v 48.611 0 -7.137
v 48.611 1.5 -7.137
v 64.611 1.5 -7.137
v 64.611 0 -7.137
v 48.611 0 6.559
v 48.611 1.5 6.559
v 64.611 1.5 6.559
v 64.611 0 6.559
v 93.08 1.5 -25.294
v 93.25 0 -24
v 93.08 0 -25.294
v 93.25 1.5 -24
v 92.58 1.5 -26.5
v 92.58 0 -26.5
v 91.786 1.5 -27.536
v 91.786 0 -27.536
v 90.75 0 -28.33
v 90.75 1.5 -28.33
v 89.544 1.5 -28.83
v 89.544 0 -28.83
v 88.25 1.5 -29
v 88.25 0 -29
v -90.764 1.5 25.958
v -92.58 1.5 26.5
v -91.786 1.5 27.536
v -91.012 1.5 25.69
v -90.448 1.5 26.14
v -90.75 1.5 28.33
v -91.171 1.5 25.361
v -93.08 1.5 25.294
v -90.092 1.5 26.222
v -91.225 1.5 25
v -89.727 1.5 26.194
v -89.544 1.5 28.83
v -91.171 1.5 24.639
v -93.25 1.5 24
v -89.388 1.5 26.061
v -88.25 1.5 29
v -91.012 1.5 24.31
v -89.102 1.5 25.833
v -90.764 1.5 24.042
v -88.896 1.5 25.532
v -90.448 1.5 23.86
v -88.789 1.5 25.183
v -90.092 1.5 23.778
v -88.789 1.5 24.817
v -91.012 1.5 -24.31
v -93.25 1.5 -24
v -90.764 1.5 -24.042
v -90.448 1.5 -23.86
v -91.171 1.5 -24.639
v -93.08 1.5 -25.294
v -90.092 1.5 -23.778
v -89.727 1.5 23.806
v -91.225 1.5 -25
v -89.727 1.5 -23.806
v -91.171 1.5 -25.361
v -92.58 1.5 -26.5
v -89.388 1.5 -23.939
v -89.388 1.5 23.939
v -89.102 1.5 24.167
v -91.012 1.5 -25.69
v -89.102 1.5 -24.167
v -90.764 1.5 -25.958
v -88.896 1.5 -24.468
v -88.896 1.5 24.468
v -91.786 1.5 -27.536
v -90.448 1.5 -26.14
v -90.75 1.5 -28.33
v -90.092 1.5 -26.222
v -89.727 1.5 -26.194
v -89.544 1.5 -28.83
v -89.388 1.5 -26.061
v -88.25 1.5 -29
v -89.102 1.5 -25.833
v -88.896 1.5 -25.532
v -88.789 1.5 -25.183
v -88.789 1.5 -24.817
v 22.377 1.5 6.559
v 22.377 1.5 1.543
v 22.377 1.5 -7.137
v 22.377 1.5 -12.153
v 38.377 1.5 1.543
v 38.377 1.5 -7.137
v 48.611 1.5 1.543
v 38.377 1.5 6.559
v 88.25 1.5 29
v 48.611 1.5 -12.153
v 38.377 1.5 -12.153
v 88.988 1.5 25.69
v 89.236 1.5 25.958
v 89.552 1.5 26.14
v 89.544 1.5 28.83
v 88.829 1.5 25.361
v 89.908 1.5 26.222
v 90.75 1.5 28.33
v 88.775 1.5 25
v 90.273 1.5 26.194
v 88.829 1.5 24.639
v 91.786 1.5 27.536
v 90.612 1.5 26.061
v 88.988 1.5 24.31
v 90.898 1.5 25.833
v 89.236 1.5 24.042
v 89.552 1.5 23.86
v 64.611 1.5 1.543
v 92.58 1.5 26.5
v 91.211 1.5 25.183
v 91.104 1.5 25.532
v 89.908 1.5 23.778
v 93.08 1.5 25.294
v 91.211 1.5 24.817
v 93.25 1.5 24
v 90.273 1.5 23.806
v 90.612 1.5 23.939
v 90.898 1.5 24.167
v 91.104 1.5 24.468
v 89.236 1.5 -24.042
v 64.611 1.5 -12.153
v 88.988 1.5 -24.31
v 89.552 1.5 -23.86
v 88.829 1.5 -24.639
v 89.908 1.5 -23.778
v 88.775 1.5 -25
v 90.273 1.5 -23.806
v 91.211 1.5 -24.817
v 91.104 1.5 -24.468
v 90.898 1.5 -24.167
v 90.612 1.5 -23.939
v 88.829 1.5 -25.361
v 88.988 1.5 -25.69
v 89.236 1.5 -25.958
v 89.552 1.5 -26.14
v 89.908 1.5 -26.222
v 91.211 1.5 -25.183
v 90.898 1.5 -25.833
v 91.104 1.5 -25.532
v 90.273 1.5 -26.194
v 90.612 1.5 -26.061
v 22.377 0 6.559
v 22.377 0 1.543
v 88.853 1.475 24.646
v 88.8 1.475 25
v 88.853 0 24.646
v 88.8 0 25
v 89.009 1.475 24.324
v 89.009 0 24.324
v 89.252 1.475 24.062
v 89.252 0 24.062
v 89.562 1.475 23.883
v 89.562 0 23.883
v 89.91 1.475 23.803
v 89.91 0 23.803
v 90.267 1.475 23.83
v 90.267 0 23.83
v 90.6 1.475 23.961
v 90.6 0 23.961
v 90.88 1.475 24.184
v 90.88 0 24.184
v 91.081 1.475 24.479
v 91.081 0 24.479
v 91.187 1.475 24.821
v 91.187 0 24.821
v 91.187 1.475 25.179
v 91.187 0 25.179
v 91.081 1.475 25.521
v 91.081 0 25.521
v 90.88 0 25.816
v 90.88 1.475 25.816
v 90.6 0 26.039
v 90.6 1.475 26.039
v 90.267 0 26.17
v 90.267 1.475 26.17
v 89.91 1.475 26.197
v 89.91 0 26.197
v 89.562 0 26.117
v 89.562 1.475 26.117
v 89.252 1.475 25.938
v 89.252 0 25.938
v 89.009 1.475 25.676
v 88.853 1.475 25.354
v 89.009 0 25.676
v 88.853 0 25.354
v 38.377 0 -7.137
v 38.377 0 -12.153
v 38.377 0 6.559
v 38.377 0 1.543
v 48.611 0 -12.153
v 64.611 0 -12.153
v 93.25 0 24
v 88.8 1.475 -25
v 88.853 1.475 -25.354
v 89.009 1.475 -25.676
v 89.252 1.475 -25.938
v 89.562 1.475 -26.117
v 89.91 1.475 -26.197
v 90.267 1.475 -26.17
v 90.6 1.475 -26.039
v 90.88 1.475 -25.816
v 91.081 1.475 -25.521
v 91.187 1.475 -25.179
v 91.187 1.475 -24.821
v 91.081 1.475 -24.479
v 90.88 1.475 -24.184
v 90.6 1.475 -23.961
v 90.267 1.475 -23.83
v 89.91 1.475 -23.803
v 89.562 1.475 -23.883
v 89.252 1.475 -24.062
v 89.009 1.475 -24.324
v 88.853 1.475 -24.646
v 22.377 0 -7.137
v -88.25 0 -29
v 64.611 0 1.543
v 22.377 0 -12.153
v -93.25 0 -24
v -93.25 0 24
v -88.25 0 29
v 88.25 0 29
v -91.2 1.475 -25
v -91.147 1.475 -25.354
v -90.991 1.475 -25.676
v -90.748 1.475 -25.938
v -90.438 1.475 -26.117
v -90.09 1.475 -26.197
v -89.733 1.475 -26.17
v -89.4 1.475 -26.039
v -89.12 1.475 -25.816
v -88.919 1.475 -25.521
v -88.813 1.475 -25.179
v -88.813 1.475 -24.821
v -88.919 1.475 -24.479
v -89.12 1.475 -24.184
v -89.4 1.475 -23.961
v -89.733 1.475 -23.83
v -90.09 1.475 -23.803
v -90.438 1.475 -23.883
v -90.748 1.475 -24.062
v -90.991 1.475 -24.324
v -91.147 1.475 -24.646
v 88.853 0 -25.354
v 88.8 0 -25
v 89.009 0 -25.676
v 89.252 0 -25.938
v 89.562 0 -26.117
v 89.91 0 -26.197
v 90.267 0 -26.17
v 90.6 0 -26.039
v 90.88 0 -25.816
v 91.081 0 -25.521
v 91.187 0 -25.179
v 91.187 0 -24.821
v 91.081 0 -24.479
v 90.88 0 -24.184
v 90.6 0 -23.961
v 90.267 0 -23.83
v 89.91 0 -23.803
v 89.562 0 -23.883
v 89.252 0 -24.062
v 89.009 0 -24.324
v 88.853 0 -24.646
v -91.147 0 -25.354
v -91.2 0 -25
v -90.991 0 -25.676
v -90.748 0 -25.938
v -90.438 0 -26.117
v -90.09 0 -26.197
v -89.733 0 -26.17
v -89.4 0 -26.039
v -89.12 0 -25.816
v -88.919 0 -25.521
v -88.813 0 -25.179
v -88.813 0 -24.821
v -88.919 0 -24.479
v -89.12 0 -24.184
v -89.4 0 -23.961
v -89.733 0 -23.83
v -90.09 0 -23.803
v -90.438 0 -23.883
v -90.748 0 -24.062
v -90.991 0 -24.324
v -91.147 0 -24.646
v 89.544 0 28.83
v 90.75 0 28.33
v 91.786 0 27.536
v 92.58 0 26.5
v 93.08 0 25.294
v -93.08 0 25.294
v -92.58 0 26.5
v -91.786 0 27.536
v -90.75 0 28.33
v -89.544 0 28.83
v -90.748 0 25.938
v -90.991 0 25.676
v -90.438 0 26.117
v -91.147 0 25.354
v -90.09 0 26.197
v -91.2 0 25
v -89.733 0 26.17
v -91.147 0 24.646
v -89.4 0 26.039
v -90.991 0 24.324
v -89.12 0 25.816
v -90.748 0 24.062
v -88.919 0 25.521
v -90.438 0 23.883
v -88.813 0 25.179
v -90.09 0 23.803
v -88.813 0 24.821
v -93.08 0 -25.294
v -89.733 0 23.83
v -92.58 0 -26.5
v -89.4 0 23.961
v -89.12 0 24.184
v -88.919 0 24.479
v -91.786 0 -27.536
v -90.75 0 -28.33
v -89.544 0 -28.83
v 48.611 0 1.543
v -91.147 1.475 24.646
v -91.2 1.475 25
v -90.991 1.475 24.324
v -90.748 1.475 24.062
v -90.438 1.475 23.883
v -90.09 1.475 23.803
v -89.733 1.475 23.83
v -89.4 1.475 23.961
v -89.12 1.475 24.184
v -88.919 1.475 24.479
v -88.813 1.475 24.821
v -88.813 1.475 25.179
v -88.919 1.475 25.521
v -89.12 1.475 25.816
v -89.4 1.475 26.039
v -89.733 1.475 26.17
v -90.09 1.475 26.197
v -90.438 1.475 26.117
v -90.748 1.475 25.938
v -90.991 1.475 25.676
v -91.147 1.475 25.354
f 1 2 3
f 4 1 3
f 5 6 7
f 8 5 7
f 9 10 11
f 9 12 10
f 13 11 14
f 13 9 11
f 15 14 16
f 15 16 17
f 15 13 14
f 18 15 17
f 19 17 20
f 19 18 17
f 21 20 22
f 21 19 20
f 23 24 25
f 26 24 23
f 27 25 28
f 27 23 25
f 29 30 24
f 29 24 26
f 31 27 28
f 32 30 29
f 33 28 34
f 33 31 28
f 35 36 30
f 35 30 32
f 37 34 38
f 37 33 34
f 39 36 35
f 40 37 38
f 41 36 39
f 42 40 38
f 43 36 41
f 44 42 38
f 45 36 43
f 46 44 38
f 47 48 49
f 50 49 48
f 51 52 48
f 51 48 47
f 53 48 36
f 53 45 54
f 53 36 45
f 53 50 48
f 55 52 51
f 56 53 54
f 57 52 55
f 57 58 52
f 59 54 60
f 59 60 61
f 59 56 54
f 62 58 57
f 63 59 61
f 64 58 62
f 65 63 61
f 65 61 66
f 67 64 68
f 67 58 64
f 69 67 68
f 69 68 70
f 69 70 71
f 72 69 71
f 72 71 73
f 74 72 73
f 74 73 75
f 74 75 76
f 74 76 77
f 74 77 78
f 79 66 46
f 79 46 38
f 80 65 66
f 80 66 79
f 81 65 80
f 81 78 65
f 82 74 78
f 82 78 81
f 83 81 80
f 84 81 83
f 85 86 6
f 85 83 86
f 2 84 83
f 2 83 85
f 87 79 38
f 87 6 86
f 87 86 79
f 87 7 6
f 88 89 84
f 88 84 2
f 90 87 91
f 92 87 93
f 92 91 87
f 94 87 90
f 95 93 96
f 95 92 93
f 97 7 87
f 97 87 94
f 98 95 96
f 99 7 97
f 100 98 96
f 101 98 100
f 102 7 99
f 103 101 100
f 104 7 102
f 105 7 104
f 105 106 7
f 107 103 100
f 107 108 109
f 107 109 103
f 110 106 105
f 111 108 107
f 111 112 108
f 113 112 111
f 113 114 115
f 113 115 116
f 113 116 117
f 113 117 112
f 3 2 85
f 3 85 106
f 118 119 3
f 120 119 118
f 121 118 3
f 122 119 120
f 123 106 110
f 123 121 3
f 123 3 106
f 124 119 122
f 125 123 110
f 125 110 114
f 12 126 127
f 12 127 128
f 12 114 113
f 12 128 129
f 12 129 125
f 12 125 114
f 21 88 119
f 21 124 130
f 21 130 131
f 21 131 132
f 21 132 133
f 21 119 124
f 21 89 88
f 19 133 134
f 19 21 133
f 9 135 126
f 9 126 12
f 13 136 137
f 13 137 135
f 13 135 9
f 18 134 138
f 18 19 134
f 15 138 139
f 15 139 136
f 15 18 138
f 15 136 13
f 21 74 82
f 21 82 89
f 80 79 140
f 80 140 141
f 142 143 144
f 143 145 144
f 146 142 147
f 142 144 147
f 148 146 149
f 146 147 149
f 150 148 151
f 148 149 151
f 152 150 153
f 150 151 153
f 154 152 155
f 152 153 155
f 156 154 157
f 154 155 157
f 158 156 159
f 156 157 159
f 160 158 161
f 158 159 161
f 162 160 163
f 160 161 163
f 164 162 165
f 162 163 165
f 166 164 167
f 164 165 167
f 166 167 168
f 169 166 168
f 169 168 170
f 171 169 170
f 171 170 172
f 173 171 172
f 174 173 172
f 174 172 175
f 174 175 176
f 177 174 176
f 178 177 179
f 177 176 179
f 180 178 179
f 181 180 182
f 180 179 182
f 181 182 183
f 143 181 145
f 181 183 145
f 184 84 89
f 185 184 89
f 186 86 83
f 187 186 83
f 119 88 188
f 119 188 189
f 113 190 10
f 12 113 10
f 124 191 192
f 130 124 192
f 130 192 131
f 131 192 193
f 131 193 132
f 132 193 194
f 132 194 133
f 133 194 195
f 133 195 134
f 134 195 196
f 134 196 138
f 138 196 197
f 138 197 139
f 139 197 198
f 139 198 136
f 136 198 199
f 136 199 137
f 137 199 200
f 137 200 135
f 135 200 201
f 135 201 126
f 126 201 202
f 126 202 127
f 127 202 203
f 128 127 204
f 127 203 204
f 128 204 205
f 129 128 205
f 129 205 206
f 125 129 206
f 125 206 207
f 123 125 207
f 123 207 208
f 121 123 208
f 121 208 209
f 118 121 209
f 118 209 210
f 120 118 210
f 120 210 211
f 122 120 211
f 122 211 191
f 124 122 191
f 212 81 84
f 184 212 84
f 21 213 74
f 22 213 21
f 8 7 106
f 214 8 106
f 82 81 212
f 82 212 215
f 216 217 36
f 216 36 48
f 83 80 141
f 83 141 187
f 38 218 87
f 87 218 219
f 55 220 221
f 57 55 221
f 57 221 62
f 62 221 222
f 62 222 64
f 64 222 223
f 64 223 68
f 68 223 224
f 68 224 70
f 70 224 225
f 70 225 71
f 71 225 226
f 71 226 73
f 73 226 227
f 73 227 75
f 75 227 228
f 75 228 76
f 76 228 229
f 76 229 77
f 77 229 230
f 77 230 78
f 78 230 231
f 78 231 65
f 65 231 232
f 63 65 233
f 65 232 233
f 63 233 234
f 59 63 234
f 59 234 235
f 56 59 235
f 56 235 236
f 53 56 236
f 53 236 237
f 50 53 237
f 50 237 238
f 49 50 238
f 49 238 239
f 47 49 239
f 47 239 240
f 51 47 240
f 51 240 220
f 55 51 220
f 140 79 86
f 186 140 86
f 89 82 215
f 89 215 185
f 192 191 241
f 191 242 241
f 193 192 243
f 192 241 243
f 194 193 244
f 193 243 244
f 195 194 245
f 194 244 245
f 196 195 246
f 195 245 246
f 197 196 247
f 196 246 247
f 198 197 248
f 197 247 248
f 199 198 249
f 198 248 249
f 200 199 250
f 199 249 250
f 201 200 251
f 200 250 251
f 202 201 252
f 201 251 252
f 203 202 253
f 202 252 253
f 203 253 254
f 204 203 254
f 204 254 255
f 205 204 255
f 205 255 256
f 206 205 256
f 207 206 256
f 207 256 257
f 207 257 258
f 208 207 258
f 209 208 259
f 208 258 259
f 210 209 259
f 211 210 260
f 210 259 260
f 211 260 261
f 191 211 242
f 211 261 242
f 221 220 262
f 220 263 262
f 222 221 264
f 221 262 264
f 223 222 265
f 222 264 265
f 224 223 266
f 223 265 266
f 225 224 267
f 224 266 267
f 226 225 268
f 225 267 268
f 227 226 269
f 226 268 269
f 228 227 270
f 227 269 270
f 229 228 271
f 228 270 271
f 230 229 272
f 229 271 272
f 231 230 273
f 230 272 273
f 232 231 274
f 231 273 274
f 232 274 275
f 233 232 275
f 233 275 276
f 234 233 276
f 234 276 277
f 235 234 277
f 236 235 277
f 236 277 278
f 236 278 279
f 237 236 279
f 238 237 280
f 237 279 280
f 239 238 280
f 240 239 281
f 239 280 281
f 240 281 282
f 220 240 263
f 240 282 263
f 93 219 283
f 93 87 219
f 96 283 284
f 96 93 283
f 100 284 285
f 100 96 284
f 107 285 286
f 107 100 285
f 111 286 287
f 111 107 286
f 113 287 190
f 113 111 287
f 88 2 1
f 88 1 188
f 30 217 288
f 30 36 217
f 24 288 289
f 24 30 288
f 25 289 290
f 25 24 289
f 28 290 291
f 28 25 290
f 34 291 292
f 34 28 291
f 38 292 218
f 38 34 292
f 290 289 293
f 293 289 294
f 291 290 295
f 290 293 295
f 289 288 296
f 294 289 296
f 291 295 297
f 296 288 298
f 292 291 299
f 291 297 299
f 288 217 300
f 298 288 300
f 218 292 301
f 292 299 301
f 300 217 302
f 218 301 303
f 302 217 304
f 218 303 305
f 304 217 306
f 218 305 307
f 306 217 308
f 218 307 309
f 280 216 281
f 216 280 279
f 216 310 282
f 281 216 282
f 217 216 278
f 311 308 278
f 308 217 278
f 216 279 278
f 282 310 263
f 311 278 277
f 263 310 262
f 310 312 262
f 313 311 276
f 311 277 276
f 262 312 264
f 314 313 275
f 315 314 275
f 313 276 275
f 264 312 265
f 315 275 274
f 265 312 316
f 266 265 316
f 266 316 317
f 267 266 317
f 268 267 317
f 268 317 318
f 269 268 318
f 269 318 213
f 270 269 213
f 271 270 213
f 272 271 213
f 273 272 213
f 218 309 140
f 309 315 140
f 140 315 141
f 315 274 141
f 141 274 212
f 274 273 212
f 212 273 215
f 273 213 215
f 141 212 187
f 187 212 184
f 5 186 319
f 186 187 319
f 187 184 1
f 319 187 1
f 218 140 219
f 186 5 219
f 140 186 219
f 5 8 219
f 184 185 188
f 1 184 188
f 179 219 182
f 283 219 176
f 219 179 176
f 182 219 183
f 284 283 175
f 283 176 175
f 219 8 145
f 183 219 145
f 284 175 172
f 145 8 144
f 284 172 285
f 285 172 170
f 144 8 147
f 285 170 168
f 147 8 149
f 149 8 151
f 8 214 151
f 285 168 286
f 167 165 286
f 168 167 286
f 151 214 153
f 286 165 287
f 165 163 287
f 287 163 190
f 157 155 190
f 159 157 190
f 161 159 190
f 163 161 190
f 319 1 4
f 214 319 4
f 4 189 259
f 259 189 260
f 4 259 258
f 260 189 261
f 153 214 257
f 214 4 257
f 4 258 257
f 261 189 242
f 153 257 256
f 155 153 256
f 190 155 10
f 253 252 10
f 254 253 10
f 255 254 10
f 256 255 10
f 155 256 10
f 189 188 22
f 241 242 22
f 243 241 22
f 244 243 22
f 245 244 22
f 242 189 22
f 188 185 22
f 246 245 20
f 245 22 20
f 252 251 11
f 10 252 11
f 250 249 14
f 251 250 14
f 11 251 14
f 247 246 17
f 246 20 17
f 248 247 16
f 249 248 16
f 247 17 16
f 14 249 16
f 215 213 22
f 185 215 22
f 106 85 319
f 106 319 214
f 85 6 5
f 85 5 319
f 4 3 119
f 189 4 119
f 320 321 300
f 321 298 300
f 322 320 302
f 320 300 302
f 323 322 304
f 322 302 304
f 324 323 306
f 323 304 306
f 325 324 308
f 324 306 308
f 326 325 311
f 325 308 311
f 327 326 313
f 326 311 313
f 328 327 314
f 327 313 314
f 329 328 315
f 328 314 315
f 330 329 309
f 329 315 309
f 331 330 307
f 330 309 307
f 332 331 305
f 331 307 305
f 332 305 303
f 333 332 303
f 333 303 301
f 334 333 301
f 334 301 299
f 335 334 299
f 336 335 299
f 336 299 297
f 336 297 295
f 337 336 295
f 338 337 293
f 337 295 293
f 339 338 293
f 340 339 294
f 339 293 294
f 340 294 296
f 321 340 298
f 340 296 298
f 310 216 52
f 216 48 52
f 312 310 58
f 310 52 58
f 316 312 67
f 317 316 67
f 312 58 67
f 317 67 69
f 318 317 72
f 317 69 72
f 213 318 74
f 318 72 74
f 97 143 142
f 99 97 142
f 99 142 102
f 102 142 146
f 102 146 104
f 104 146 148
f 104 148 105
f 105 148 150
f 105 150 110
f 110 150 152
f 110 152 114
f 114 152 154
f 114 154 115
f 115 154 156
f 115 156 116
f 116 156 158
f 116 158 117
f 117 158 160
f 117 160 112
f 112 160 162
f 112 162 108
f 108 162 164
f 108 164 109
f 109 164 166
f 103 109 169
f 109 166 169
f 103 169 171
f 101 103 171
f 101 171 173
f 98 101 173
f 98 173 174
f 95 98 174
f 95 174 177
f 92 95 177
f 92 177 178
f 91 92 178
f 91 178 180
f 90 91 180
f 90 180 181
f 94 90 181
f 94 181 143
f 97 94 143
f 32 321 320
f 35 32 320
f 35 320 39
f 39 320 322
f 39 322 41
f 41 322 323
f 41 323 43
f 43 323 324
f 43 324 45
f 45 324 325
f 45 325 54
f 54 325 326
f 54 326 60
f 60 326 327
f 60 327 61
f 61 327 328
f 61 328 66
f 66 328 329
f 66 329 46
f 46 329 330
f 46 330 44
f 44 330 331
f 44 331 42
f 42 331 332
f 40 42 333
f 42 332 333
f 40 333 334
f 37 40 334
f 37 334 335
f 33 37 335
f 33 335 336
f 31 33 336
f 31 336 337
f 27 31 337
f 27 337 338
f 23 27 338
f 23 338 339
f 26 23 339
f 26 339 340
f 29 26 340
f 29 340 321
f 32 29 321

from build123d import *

# Parameters (mm, degrees)
SKETCH1_W                      = 186.5
SKETCH1_H                      = 58
BOSS_EXTRUDE1_DEPTH            = 1.5
FILLET1_R                      = 5
M2_CLEARANCE_HOLE1_D           = 2.4
M2_CLEARANCE_HOLE1_CSINK_D     = 2.45
M2_CLEARANCE_HOLE1_CSINK_ANGLE = 90
SKETCH4_W                      = 16
SKETCH4_H                      = 5.015455786
CUT_EXTRUDE1_DEPTH             = 98.666844425


with BuildPart() as part:
    # Sketch1 → Boss-Extrude1 (new body)
    with BuildSketch(Plane(origin=(0, 0, 0), x_dir=(1, 0, 0), z_dir=(0, 1, 0))):
        Rectangle(SKETCH1_W, SKETCH1_H)
    extrude(amount=BOSS_EXTRUDE1_DEPTH)

    # Fillet1
    fillet1_edges = [part.edges().sort_by_distance(p)[0] for p in [
        (-93.25, 0.75, -29),
        (93.25, 0.75, -29),
        (93.25, 0.75, 29),
        (-93.25, 0.75, 29),
    ]]
    fillet(fillet1_edges, radius=FILLET1_R)

    # M2 Clearance Hole1 (through all)
    with Locations(Plane(origin=(0, 1.5, 0), x_dir=(1, 0, 0), z_dir=(0, 1, 0))):
        with Locations((-90, 25), (90, 25), (90, -25), (-90, -25)):
            CounterSinkHole(M2_CLEARANCE_HOLE1_D / 2, M2_CLEARANCE_HOLE1_CSINK_D / 2, counter_sink_angle=M2_CLEARANCE_HOLE1_CSINK_ANGLE)

    # Sketch4 → Cut-Extrude1 (cut, through all)
    with BuildSketch(Plane(origin=(0, 1.5, 0), x_dir=(1, 0, 0), z_dir=(0, 1, 0))):
        with Locations((30.376648893, 9.645107281)):
            Rectangle(SKETCH4_W, SKETCH4_H)
        with Locations((56.611340698, 9.645107281)):
            Rectangle(SKETCH4_W, SKETCH4_H)
        with Locations((30.376648893, -4.050945058)):
            Rectangle(SKETCH4_W, SKETCH4_H)
        with Locations((56.611340698, -4.050945058)):
            Rectangle(SKETCH4_W, SKETCH4_H)
    extrude(amount=-CUT_EXTRUDE1_DEPTH, mode=Mode.SUBTRACT)


solid = part.part
